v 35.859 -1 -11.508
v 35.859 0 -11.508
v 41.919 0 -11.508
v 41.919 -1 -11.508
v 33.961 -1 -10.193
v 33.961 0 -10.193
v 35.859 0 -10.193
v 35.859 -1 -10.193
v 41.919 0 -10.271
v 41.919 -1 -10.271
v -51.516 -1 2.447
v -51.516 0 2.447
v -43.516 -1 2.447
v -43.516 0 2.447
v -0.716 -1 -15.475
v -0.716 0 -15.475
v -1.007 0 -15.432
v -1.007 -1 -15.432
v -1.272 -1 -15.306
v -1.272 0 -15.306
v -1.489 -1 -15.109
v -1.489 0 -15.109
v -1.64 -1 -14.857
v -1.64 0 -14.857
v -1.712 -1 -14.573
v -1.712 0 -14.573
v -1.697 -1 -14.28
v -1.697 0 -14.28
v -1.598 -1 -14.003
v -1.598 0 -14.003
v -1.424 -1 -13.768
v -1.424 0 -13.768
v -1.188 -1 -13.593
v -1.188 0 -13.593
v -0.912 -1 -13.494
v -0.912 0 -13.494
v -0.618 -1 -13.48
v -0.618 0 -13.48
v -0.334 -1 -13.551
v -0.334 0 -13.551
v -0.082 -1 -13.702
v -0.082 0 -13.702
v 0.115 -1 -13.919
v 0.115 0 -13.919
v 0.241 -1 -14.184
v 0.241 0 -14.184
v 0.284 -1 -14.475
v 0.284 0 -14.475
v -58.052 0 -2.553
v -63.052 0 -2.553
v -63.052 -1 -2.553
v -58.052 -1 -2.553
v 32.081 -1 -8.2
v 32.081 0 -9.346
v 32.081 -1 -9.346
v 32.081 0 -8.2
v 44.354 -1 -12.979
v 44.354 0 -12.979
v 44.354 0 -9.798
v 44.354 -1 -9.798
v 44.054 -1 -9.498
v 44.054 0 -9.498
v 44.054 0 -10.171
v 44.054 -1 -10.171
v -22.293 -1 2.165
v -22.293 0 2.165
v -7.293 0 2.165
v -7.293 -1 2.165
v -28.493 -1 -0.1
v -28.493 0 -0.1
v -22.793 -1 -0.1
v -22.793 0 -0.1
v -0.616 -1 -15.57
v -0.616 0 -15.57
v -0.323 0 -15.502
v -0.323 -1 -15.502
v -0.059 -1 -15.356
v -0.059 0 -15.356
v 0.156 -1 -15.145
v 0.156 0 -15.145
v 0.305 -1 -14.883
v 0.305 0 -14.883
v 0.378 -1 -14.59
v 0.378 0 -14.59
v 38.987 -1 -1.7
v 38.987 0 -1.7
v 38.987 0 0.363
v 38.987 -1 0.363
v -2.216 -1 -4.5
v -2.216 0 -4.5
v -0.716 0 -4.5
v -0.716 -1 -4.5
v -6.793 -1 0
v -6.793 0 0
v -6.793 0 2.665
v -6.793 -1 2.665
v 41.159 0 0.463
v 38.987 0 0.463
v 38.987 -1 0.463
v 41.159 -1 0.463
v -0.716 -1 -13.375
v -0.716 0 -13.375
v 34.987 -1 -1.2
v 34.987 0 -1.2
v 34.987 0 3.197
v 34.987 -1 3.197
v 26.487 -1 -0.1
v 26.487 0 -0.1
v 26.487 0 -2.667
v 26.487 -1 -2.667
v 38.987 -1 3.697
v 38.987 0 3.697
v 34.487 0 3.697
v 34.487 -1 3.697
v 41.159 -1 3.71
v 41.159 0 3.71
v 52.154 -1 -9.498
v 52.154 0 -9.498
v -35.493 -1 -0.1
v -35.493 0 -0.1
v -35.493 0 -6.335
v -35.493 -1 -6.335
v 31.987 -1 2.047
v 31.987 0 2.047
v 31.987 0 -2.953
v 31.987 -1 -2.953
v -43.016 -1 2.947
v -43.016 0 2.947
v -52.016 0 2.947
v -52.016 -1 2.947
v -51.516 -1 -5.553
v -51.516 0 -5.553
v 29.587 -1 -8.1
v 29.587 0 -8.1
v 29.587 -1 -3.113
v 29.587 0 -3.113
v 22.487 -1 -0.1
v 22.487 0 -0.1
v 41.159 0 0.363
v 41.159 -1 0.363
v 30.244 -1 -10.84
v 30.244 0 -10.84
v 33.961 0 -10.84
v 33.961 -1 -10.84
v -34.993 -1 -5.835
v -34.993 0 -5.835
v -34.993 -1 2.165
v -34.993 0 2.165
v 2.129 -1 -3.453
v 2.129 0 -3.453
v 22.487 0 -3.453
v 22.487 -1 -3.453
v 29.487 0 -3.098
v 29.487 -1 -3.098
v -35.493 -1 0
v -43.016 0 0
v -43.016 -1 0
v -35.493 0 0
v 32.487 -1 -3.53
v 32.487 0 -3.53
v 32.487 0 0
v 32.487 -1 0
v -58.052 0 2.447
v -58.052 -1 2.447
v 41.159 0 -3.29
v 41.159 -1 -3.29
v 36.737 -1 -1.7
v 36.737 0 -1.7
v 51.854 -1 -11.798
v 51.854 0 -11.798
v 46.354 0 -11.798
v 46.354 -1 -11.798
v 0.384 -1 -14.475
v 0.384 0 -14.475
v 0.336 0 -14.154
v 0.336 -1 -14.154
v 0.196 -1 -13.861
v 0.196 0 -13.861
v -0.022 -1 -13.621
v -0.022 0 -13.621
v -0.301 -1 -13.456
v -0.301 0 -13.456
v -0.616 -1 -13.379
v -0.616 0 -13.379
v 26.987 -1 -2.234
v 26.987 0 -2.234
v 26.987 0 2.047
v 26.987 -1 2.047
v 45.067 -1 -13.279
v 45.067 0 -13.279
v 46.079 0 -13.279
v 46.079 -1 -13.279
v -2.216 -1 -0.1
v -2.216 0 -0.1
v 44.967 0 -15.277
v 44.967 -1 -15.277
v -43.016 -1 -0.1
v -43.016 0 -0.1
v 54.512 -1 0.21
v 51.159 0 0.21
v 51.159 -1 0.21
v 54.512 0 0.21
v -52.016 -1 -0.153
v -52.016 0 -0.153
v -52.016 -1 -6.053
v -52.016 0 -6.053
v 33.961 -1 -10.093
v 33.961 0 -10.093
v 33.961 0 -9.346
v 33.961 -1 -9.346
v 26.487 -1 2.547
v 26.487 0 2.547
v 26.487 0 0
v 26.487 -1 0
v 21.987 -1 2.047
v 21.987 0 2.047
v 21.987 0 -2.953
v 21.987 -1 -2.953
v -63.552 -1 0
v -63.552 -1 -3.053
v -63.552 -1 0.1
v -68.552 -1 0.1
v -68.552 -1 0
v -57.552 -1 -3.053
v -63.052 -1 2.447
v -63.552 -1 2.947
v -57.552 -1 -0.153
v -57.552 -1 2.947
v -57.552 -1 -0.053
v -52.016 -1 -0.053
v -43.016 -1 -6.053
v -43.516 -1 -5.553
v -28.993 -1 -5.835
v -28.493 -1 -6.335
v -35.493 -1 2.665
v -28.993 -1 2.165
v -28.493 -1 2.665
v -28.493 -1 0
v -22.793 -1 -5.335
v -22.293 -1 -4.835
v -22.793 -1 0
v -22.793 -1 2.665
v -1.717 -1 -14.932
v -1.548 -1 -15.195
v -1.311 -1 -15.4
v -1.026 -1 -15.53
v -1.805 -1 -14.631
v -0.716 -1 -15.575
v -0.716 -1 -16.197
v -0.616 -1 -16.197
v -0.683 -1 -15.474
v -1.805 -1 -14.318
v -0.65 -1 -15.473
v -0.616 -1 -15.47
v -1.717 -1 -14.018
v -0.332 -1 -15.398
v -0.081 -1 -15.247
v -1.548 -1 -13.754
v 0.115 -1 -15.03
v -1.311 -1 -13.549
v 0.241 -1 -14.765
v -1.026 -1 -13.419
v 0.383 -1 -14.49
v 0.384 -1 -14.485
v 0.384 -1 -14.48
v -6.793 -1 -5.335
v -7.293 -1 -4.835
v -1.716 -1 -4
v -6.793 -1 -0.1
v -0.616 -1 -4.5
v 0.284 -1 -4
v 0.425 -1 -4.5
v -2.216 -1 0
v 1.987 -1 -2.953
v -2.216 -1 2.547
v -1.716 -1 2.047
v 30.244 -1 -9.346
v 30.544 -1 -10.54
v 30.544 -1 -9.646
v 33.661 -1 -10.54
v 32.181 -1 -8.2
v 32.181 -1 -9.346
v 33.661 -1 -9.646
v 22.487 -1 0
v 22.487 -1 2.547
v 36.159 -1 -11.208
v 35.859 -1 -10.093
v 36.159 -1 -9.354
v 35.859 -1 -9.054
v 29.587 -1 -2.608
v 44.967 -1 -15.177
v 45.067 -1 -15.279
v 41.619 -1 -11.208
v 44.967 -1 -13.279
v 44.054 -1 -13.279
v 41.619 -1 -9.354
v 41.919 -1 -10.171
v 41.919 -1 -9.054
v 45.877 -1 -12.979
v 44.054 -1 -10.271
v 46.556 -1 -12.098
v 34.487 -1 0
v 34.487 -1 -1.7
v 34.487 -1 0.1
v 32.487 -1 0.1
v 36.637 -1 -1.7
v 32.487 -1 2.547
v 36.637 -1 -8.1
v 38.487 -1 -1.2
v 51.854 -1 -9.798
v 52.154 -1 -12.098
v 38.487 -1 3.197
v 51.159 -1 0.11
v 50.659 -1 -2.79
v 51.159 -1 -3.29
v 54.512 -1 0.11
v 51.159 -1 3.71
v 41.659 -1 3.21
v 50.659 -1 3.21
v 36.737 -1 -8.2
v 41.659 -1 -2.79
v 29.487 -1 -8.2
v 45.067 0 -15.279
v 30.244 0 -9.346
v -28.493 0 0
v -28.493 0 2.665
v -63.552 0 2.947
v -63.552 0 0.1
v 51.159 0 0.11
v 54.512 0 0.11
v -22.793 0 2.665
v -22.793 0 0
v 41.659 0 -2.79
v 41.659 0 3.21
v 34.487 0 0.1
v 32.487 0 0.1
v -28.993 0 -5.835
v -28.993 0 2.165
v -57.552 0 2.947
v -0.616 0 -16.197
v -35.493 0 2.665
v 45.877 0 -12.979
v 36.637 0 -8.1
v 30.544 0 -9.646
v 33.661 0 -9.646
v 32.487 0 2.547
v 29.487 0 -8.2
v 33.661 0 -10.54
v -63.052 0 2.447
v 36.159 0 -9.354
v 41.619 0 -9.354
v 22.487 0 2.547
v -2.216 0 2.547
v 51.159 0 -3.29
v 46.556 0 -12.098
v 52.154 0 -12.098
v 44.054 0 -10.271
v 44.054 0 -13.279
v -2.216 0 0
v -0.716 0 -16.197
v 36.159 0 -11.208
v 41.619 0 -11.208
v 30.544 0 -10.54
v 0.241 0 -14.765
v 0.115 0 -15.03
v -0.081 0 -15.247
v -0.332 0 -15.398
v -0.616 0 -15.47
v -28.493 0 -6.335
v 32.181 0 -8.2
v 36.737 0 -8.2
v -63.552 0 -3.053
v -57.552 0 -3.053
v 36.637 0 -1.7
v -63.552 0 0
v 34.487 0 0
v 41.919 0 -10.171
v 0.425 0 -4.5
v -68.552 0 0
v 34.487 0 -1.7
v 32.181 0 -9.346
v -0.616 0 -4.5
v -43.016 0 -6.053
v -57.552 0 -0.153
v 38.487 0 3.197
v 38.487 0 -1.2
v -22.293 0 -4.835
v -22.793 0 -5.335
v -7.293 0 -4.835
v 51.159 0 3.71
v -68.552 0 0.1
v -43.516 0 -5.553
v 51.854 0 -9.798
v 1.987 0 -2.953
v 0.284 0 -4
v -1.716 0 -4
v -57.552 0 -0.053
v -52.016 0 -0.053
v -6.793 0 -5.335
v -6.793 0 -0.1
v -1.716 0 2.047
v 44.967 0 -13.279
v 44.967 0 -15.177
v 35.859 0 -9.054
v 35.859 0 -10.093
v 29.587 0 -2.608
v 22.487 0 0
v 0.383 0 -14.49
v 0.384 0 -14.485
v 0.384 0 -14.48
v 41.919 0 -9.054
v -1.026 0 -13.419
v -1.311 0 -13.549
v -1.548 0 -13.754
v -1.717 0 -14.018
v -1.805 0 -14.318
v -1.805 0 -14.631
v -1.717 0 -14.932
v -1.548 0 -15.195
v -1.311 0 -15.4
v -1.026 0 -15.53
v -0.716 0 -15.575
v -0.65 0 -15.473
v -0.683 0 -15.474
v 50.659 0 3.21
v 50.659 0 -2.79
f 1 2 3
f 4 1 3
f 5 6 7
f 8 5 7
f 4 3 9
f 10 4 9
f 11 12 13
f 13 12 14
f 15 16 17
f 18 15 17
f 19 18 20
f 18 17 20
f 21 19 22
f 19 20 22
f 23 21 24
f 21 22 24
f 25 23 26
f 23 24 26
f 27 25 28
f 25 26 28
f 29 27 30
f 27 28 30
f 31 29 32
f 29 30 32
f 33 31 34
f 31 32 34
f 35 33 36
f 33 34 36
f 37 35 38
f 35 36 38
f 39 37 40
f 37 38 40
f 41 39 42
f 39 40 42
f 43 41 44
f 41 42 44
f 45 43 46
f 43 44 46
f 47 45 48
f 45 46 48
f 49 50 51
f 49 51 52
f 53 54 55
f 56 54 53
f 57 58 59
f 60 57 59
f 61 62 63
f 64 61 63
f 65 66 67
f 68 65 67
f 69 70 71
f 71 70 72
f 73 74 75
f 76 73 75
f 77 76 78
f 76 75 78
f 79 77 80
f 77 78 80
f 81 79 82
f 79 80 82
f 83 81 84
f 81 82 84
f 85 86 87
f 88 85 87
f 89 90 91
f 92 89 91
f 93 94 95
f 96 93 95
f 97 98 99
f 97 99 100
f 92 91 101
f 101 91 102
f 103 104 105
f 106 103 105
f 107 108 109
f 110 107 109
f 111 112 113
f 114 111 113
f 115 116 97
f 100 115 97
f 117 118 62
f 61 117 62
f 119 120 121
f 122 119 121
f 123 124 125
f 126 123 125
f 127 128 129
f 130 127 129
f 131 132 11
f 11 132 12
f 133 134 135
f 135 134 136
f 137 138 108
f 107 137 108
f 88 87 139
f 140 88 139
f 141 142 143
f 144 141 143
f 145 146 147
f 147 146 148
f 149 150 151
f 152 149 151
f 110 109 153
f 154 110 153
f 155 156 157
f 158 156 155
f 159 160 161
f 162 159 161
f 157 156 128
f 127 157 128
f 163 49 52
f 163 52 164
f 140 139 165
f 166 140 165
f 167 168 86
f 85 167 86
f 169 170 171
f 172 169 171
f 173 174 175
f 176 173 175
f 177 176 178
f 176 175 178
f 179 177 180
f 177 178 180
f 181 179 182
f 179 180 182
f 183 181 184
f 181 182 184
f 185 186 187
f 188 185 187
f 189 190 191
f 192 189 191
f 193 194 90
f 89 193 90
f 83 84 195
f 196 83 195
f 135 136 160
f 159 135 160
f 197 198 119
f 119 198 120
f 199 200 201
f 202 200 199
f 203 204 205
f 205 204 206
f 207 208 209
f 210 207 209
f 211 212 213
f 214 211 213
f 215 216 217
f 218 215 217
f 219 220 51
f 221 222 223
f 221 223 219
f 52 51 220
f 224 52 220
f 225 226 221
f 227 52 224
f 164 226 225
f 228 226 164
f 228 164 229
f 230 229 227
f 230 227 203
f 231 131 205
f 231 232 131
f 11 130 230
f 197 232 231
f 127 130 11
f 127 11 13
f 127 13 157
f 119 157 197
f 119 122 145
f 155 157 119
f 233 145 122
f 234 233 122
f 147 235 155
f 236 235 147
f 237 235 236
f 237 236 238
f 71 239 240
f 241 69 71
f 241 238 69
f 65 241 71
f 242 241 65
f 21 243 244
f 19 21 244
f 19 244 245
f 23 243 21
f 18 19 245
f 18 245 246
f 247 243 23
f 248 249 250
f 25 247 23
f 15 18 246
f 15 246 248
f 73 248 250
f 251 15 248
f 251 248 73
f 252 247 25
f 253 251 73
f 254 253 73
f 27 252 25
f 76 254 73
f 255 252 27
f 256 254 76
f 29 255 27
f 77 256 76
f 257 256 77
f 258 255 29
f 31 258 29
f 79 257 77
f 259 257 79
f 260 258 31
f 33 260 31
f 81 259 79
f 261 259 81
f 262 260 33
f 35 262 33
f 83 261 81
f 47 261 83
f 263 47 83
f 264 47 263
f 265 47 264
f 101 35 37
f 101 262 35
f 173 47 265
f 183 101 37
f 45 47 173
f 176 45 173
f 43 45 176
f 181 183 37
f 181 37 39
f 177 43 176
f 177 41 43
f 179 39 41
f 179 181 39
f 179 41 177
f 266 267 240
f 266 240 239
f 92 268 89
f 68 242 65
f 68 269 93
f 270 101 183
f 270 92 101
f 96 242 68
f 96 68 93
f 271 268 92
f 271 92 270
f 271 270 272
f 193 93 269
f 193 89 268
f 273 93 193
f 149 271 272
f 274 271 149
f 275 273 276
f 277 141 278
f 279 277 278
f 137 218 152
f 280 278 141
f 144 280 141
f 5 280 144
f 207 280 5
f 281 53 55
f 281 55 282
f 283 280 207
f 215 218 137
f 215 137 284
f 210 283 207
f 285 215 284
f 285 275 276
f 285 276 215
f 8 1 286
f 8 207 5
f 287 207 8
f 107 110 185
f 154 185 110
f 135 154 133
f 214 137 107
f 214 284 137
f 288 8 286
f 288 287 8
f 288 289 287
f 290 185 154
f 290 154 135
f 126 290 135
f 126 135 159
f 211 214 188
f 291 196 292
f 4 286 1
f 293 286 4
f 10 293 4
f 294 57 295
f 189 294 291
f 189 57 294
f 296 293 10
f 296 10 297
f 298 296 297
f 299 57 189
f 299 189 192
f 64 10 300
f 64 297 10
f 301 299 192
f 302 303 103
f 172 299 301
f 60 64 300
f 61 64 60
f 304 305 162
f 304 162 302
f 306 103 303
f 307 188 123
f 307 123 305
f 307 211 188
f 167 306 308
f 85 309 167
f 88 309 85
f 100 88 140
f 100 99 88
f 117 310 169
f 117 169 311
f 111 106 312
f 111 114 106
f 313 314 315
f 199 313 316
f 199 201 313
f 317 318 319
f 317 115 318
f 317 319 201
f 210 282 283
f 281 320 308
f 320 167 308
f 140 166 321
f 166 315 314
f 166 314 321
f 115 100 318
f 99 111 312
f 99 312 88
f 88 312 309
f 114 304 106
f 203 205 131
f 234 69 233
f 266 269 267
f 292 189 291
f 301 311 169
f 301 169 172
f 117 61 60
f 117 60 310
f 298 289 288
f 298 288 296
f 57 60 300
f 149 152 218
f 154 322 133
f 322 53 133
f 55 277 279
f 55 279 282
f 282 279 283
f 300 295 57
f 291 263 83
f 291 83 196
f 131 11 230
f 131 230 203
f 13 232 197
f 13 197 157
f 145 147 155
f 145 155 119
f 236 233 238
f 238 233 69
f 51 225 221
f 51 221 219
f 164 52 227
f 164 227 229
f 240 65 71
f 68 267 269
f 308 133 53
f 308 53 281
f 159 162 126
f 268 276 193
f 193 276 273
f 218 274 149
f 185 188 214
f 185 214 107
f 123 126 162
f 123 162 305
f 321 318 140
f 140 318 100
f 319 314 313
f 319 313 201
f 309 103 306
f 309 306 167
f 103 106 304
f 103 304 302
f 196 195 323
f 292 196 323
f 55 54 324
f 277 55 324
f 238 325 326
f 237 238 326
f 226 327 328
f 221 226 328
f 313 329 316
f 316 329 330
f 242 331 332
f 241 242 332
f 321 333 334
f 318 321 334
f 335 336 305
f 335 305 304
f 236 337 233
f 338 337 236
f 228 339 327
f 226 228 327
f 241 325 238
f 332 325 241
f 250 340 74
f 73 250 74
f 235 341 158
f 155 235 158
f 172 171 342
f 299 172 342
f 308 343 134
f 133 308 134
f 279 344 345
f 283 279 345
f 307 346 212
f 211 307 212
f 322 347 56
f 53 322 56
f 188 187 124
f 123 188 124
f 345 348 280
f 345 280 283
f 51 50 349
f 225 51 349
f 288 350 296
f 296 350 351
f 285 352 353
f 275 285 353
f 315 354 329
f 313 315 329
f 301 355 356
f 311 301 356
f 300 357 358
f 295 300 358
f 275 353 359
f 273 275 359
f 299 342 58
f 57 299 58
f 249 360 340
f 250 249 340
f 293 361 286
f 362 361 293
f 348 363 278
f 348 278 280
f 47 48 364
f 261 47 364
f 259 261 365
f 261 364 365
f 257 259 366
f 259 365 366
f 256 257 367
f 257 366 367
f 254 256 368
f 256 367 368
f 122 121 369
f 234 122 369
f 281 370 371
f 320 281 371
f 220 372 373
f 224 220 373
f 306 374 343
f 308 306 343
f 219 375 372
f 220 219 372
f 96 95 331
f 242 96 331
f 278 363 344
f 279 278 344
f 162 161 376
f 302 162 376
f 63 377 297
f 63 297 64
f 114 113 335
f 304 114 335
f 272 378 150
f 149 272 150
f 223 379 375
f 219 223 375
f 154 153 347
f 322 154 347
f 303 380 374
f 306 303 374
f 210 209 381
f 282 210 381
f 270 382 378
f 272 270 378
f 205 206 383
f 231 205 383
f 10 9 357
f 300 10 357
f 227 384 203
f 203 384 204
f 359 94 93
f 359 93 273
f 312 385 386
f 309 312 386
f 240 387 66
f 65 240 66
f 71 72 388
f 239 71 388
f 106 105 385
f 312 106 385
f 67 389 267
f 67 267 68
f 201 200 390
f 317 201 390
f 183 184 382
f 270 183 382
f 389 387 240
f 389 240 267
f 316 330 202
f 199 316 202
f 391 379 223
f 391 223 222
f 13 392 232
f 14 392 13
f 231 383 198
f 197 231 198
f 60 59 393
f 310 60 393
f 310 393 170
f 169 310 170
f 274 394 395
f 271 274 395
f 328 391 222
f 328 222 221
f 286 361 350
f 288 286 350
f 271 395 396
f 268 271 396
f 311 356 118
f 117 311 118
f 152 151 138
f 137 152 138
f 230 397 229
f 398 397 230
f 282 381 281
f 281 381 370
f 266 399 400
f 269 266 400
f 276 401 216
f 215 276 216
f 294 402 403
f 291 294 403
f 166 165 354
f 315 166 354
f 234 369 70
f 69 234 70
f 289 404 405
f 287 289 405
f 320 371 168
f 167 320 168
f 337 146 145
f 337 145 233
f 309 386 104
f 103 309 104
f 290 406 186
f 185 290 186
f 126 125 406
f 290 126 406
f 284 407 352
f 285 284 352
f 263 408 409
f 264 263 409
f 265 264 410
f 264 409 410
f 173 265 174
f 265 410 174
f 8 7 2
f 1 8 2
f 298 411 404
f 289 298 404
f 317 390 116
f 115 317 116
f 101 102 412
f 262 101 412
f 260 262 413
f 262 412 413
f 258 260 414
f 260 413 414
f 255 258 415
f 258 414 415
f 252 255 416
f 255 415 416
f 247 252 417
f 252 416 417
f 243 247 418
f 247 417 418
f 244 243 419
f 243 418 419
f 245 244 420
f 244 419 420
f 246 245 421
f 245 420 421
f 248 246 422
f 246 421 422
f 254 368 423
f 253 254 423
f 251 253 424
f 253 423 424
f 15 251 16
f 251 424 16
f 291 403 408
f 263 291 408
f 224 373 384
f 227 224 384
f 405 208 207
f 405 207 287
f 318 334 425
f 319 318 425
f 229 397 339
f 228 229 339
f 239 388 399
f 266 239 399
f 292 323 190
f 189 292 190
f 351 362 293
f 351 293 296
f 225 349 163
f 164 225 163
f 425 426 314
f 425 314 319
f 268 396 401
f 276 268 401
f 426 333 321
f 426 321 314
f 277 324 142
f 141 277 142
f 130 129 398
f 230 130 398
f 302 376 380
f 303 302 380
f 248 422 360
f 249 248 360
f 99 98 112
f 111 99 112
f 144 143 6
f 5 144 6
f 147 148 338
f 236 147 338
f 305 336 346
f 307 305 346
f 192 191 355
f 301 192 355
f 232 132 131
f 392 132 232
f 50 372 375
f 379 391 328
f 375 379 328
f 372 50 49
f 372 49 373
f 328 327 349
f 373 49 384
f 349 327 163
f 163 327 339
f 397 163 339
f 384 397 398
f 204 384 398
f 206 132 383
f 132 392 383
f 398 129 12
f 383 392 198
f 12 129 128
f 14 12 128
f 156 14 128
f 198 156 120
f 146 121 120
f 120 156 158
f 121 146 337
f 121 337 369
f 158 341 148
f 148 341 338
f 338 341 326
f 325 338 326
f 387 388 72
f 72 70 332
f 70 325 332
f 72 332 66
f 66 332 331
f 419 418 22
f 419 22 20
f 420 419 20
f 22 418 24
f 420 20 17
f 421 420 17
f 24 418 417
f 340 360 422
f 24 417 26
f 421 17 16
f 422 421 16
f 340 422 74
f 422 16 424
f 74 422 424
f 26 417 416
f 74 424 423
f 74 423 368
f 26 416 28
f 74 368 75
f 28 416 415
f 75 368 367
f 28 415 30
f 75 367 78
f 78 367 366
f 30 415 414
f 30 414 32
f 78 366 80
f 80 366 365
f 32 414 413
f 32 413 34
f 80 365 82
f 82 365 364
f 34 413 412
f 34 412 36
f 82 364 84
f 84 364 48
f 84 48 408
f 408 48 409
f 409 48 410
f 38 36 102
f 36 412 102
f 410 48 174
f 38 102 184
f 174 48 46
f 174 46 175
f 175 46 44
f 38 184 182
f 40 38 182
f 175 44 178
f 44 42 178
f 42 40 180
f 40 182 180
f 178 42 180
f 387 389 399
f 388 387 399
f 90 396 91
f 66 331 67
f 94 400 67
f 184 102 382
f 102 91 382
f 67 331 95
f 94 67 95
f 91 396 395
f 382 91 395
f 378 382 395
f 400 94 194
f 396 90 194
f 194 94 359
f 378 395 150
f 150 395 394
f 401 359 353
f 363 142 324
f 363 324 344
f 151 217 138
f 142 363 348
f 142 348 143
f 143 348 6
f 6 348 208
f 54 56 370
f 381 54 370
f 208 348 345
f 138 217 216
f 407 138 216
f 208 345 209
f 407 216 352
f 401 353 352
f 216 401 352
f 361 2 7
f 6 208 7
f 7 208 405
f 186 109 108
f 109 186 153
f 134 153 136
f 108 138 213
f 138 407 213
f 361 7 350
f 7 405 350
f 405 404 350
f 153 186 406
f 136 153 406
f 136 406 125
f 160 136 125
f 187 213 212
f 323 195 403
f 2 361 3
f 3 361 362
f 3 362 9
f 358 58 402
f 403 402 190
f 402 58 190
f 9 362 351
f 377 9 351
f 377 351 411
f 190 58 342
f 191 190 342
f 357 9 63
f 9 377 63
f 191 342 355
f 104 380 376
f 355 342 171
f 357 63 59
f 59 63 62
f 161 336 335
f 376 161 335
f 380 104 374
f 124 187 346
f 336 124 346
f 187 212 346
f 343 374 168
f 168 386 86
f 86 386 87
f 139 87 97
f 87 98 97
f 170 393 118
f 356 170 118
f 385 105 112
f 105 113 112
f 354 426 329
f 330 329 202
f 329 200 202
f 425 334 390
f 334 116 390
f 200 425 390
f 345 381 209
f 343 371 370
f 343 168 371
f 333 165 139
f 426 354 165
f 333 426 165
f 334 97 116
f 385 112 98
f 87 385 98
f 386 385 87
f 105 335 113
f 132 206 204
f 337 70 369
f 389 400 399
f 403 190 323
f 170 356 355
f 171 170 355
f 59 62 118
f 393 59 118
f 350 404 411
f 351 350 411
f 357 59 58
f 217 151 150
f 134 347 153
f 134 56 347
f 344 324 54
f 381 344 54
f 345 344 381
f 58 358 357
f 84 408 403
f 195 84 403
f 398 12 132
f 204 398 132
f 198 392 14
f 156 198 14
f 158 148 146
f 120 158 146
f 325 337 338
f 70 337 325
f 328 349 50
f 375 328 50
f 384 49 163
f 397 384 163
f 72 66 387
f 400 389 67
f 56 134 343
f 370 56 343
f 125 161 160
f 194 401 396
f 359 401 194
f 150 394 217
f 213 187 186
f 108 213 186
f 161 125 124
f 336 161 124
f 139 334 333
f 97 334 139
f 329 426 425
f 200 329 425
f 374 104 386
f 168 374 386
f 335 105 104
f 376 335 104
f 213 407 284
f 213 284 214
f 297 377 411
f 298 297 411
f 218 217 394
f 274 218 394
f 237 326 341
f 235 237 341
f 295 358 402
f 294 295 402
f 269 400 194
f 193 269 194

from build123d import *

# Parameters (mm, degrees)
F0_W     = 0.1
F0_H     = 0.5
F0_W_2   = 4.5762195215
F0_H_2   = 0.1
F0_W_3   = 15
F0_H_3   = 7
F0_W_4   = 4
F0_W_5   = 5.7000000263
F0_W_6   = 6
F0_H_4   = 8
F0_W_7   = 2.1349615479
F0_W_8   = 5.4599995956
F0_H_5   = 1.8540623203
F0_H_6   = 1.1455476638
F0_W_9   = 7.5237791166
F0_W_10  = 2
F0_W_11  = 3.1167556109
F0_H_7   = 0.894062461
F0_W_12  = 8
F0_W_13  = 1.8985043958
F0_W_14  = 5.535091728
F0_W_15  = 2.1720023397
F0_W_16  = 5
F0_H_8   = 5
F0_W_17  = 9
F0_H_9   = 6
F0_W_18  = 3.3521689058
F1_DEPTH = 1


with BuildPart() as f1:
    # F0 (on Front) → F1 (new body)
    with BuildSketch(Plane.XZ):
        Polygon((-0.7164276307, -4), (-1.7164276307, -4), (-1.7164276307, 2.0474093835), (21.9873721178, 2.0474093835), (21.9873721178, -2.9525906165), (1.9873721178, -2.9525906165), (0.2835723693, -4), (-0.6164276307, -4), (-0.6164276307, -4.5), (0.4249689693, -4.5), (2.1287687179, -3.4525906165), (22.4873721178, -3.4525906165), (22.4873721178, -0.1), (22.4873721178, 0), (22.4873721178, 2.5474093835), (-2.2164276307, 2.5474093835), (-2.2164276307, 0), (-2.2164276307, -0.1), (-2.2164276307, -4.5), (-0.7164276307, -4.5), align=None)
        with Locations((-0.6664276307, -4.25)):
            Rectangle(F0_W, F0_H)
        with BuildLine():
            Line((-0.6164276307, -4.5), (-0.7164276307, -4.5))
            Line((-0.7164276307, -4.5), (-0.7164276307, -13.3747674979))
            ThreePointArc((-0.7164276307, -13.3747674979), (-0.6663757902, -13.3759068091), (-0.6164276307, -13.3793223828))
            Line((-0.6164276307, -13.3793223828), (-0.6164276307, -4.5))
        make_face()
        with BuildLine():
            ThreePointArc((-0.6164276307, -13.3793223828), (-0.6663757902, -13.3759068091), (-0.7164276307, -13.3747674979))
            ThreePointArc((-0.7164276307, -13.3747674979), (-1.8164276307, -14.4747674979), (-0.7164276307, -15.5747674979))
            Line((-0.7164276307, -15.5747674979), (-0.7164276307, -15.4747674979))
            ThreePointArc((-0.7164276307, -15.4747674979), (-1.4235344119, -13.7676607167), (0.2835723693, -14.4747674979))
            ThreePointArc((0.2835723693, -14.4747674979), (0.025192218, -15.1455878911), (-0.6164276307, -15.469754935))
            Line((-0.6164276307, -15.469754935), (-0.6164276307, -15.5702126129))
            ThreePointArc((-0.6164276307, -15.5702126129), (0.0559267082, -15.2580099731), (0.3775103589, -14.5900917138))
            ThreePointArc((0.3775103589, -14.5900917138), (0.3816245836, -14.5401994065), (0.3834645069, -14.4901715758))
            ThreePointArc((0.3834645069, -14.4901715758), (0.3835454033, -14.4824697256), (0.3835723693, -14.4747674979))
            ThreePointArc((0.3835723693, -14.4747674979), (0.0959762097, -13.7331476491), (-0.6164276307, -13.3793223828))
        make_face()
        with BuildLine():
            Line((-0.7164276307, -15.4747674979), (-0.7164276307, -15.5747674979))
            ThreePointArc((-0.7164276307, -15.5747674979), (-0.6663757902, -15.5736281866), (-0.6164276307, -15.5702126129))
            Line((-0.6164276307, -15.5702126129), (-0.6164276307, -15.469754935))
            ThreePointArc((-0.6164276307, -15.469754935), (-0.6663648557, -15.473513571), (-0.7164276307, -15.4747674979))
        make_face()
        with BuildLine():
            ThreePointArc((-0.6164276307, -15.5702126129), (-0.6663757902, -15.5736281866), (-0.7164276307, -15.5747674979))
            Line((-0.7164276307, -15.5747674979), (-0.7164276307, -16.196783632))
            Line((-0.7164276307, -16.196783632), (-0.6164276307, -16.196783632))
            Line((-0.6164276307, -16.196783632), (-0.6164276307, -15.5702126129))
        make_face()
        with Locations((-4.5045373915, -0.05)):
            Rectangle(F0_W_2, F0_H_2)
        Polygon((-6.7926471522, -5.3350963127), (-6.7926471522, -0.1), (-6.7926471522, 0), (-6.7926471522, 2.6649036873), (-22.7926471522, 2.6649036873), (-22.7926471522, 0), (-22.7926471522, -0.1), (-22.7926471522, -5.3350963127), align=None)
        with Locations((-14.7926471522, -1.3350963127)):
            Rectangle(F0_W_3, F0_H_3, mode=Mode.SUBTRACT)
        with BuildLine():
            Line((44.9668482701, -15.1770115764), (0.3834645069, -14.4901715758))
            ThreePointArc((0.3834645069, -14.4901715758), (0.3816245836, -14.5401994065), (0.3775103589, -14.5900917138))
            Line((0.3775103589, -14.5900917138), (44.9668482701, -15.2770234426))
            Line((44.9668482701, -15.2770234426), (45.0668482701, -15.2785640165))
            Line((45.0668482701, -15.2785640165), (45.0668482701, -15.1785521504))
            Line((45.0668482701, -15.1785521504), (45.0668482701, -13.2785640165))
            Line((45.0668482701, -13.2785640165), (44.9668482701, -13.2785640165))
            Line((44.9668482701, -13.2785640165), (44.9668482701, -15.1770115764))
        make_face()
        with Locations((24.4873721178, -0.05)):
            Rectangle(F0_W_4, F0_H_2)
        Polygon((26.4873721178, 0), (26.4873721178, -0.1), (26.4873721178, -2.6669805495), (29.4873721178, -3.0982994409), (29.5873721178, -3.1126767373), (32.4873721178, -3.5296183324), (32.4873721178, 0), (32.4873721178, 0.1), (32.4873721178, 2.5474093835), (26.4873721178, 2.5474093835), (26.4873721178, 0.0474093835), align=None)
        Polygon((26.9873721178, -2.2337257974), (26.9873721178, 0.0474093835), (26.9873721178, 2.0474093835), (31.9873721178, 2.0474093835), (31.9873721178, -2.9525906165), (29.5873721178, -2.6075355033), align=None, mode=Mode.SUBTRACT)
        Polygon((44.0542930675, -13.2785640165), (44.9668482701, -13.2785640165), (45.0668482701, -13.2785640165), (46.0794034727, -13.2785640165), (46.5562570157, -12.0984218523), (52.1539116397, -12.0984218523), (52.1539116397, -9.4984218523), (44.0542930675, -9.4984218523), (44.0542930675, -10.1705333218), (44.0542930675, -10.2705333218), align=None)
        Polygon((51.8539116397, -11.7984218523), (46.3539116397, -11.7984218523), (45.8770580967, -12.9785640165), (44.3542930675, -12.9785640165), (44.3542930675, -9.7984218523), (51.8539116397, -9.7984218523), align=None, mode=Mode.SUBTRACT)
        with Locations((-25.6426471653, -0.05)):
            Rectangle(F0_W_5, F0_H_2)
        Polygon((-28.4926471785, -6.3350963127), (-28.4926471785, -0.1), (-28.4926471785, 0), (-28.4926471785, 2.6649036873), (-35.4926471785, 2.6649036873), (-35.4926471785, 0), (-35.4926471785, -0.1), (-35.4926471785, -6.3350963127), align=None)
        with Locations((-31.9926471785, -1.8350963127)):
            Rectangle(F0_W_6, F0_H_4, mode=Mode.SUBTRACT)
        Polygon((29.5873721178, -3.1126767373), (29.4873721178, -3.0982994409), (29.4873721178, -8.2004475985), (32.0807600558, -8.2004475985), (32.1807600558, -8.2004475985), (36.7373721178, -8.2004475985), (36.7373721178, -1.7004475985), (36.6373721178, -1.7004475985), (36.6373721178, -8.1004475985), (29.5873721178, -8.1004475985), align=None)
        with Locations((42.9868122936, -10.2205333218)):
            Rectangle(F0_W_7, F0_H_2)
        Polygon((41.9193315196, -11.5084912181), (41.9193315196, -10.2705333218), (41.9193315196, -10.1705333218), (41.9193315196, -9.0544288978), (35.859331924, -9.0544288978), (35.859331924, -10.0930264927), (35.859331924, -10.1930264927), (35.859331924, -11.5084912181), align=None)
        with Locations((38.8893317218, -10.2814600579)):
            Rectangle(F0_W_8, F0_H_5, mode=Mode.SUBTRACT)
        with Locations((32.1307600558, -8.7732214304)):
            Rectangle(F0_W, F0_H_6)
        with Locations((-39.2545367368, -0.05)):
            Rectangle(F0_W_9, F0_H_2)
        with Locations((33.4873721178, 0.05)):
            Rectangle(F0_W_10, F0_H_2)
        Polygon((32.1807600558, -9.3459952623), (32.0807600558, -9.3459952623), (30.2440719174, -9.3459952623), (30.2440719174, -10.8400577232), (33.9608275283, -10.8400577232), (33.9608275283, -10.1930264927), (33.9608275283, -10.0930264927), (33.9608275283, -9.3459952623), align=None)
        with Locations((32.1024497228, -10.0930264927)):
            Rectangle(F0_W_11, F0_H_7, mode=Mode.SUBTRACT)
        Polygon((-43.016426295, -6.0529528502), (-43.016426295, -0.1), (-43.016426295, 0), (-43.016426295, 2.9470471498), (-52.016426295, 2.9470471498), (-52.016426295, -0.0529528502), (-52.016426295, -0.1529528502), (-52.016426295, -6.0529528502), align=None)
        with Locations((-47.516426295, -1.5529528502)):
            Rectangle(F0_W_12, F0_H_4, mode=Mode.SUBTRACT)
        Polygon((34.4873721178, 3.6967870891), (34.4873721178, 0.1), (34.4873721178, 0), (34.4873721178, -1.7004475985), (36.6373721178, -1.7004475985), (36.7373721178, -1.7004475985), (38.9873721178, -1.7004475985), (38.9873721178, 0.3627240414), (38.9873721178, 0.4627240414), (38.9873721178, 3.6967870891), align=None)
        Polygon((34.9873721178, -1.2004475985), (34.9873721178, 0), (34.9873721178, 3.1967870891), (38.4873721178, 3.1967870891), (38.4873721178, -1.2004475985), align=None, mode=Mode.SUBTRACT)
        with Locations((34.9100797262, -10.1430264927)):
            Rectangle(F0_W_13, F0_H_2)
        with Locations((-54.783972159, -0.1029528502)):
            Rectangle(F0_W_14, F0_H_2)
        with Locations((40.0733732877, 0.4127240414)):
            Rectangle(F0_W_15, F0_H_2)
        Polygon((-57.551518023, -3.0529528502), (-57.551518023, -0.1529528502), (-57.551518023, -0.0529528502), (-57.551518023, 2.9470471498), (-63.551518023, 2.9470471498), (-63.551518023, 0.1), (-63.551518023, 0), (-63.551518023, -3.0529528502), align=None)
        with Locations((-60.551518023, -0.0529528502)):
            Rectangle(F0_W_16, F0_H_8, mode=Mode.SUBTRACT)
        Polygon((41.1593744576, 3.7098635044), (41.1593744576, 0.4627240414), (41.1593744576, 0.3627240414), (41.1593744576, -3.2901364956), (51.1593744576, -3.2901364956), (51.1593744576, 0.1098635044), (51.1593744576, 0.2098635044), (51.1593744576, 3.7098635044), align=None)
        with Locations((46.1593744576, 0.2098635044)):
            Rectangle(F0_W_17, F0_H_9, mode=Mode.SUBTRACT)
        with Locations((-66.051518023, 0.05)):
            Rectangle(F0_W_16, F0_H_2)
        with Locations((52.8354589105, 0.1598635044)):
            Rectangle(F0_W_18, F0_H_2)
    extrude(amount=F1_DEPTH)


solid = f1.part
